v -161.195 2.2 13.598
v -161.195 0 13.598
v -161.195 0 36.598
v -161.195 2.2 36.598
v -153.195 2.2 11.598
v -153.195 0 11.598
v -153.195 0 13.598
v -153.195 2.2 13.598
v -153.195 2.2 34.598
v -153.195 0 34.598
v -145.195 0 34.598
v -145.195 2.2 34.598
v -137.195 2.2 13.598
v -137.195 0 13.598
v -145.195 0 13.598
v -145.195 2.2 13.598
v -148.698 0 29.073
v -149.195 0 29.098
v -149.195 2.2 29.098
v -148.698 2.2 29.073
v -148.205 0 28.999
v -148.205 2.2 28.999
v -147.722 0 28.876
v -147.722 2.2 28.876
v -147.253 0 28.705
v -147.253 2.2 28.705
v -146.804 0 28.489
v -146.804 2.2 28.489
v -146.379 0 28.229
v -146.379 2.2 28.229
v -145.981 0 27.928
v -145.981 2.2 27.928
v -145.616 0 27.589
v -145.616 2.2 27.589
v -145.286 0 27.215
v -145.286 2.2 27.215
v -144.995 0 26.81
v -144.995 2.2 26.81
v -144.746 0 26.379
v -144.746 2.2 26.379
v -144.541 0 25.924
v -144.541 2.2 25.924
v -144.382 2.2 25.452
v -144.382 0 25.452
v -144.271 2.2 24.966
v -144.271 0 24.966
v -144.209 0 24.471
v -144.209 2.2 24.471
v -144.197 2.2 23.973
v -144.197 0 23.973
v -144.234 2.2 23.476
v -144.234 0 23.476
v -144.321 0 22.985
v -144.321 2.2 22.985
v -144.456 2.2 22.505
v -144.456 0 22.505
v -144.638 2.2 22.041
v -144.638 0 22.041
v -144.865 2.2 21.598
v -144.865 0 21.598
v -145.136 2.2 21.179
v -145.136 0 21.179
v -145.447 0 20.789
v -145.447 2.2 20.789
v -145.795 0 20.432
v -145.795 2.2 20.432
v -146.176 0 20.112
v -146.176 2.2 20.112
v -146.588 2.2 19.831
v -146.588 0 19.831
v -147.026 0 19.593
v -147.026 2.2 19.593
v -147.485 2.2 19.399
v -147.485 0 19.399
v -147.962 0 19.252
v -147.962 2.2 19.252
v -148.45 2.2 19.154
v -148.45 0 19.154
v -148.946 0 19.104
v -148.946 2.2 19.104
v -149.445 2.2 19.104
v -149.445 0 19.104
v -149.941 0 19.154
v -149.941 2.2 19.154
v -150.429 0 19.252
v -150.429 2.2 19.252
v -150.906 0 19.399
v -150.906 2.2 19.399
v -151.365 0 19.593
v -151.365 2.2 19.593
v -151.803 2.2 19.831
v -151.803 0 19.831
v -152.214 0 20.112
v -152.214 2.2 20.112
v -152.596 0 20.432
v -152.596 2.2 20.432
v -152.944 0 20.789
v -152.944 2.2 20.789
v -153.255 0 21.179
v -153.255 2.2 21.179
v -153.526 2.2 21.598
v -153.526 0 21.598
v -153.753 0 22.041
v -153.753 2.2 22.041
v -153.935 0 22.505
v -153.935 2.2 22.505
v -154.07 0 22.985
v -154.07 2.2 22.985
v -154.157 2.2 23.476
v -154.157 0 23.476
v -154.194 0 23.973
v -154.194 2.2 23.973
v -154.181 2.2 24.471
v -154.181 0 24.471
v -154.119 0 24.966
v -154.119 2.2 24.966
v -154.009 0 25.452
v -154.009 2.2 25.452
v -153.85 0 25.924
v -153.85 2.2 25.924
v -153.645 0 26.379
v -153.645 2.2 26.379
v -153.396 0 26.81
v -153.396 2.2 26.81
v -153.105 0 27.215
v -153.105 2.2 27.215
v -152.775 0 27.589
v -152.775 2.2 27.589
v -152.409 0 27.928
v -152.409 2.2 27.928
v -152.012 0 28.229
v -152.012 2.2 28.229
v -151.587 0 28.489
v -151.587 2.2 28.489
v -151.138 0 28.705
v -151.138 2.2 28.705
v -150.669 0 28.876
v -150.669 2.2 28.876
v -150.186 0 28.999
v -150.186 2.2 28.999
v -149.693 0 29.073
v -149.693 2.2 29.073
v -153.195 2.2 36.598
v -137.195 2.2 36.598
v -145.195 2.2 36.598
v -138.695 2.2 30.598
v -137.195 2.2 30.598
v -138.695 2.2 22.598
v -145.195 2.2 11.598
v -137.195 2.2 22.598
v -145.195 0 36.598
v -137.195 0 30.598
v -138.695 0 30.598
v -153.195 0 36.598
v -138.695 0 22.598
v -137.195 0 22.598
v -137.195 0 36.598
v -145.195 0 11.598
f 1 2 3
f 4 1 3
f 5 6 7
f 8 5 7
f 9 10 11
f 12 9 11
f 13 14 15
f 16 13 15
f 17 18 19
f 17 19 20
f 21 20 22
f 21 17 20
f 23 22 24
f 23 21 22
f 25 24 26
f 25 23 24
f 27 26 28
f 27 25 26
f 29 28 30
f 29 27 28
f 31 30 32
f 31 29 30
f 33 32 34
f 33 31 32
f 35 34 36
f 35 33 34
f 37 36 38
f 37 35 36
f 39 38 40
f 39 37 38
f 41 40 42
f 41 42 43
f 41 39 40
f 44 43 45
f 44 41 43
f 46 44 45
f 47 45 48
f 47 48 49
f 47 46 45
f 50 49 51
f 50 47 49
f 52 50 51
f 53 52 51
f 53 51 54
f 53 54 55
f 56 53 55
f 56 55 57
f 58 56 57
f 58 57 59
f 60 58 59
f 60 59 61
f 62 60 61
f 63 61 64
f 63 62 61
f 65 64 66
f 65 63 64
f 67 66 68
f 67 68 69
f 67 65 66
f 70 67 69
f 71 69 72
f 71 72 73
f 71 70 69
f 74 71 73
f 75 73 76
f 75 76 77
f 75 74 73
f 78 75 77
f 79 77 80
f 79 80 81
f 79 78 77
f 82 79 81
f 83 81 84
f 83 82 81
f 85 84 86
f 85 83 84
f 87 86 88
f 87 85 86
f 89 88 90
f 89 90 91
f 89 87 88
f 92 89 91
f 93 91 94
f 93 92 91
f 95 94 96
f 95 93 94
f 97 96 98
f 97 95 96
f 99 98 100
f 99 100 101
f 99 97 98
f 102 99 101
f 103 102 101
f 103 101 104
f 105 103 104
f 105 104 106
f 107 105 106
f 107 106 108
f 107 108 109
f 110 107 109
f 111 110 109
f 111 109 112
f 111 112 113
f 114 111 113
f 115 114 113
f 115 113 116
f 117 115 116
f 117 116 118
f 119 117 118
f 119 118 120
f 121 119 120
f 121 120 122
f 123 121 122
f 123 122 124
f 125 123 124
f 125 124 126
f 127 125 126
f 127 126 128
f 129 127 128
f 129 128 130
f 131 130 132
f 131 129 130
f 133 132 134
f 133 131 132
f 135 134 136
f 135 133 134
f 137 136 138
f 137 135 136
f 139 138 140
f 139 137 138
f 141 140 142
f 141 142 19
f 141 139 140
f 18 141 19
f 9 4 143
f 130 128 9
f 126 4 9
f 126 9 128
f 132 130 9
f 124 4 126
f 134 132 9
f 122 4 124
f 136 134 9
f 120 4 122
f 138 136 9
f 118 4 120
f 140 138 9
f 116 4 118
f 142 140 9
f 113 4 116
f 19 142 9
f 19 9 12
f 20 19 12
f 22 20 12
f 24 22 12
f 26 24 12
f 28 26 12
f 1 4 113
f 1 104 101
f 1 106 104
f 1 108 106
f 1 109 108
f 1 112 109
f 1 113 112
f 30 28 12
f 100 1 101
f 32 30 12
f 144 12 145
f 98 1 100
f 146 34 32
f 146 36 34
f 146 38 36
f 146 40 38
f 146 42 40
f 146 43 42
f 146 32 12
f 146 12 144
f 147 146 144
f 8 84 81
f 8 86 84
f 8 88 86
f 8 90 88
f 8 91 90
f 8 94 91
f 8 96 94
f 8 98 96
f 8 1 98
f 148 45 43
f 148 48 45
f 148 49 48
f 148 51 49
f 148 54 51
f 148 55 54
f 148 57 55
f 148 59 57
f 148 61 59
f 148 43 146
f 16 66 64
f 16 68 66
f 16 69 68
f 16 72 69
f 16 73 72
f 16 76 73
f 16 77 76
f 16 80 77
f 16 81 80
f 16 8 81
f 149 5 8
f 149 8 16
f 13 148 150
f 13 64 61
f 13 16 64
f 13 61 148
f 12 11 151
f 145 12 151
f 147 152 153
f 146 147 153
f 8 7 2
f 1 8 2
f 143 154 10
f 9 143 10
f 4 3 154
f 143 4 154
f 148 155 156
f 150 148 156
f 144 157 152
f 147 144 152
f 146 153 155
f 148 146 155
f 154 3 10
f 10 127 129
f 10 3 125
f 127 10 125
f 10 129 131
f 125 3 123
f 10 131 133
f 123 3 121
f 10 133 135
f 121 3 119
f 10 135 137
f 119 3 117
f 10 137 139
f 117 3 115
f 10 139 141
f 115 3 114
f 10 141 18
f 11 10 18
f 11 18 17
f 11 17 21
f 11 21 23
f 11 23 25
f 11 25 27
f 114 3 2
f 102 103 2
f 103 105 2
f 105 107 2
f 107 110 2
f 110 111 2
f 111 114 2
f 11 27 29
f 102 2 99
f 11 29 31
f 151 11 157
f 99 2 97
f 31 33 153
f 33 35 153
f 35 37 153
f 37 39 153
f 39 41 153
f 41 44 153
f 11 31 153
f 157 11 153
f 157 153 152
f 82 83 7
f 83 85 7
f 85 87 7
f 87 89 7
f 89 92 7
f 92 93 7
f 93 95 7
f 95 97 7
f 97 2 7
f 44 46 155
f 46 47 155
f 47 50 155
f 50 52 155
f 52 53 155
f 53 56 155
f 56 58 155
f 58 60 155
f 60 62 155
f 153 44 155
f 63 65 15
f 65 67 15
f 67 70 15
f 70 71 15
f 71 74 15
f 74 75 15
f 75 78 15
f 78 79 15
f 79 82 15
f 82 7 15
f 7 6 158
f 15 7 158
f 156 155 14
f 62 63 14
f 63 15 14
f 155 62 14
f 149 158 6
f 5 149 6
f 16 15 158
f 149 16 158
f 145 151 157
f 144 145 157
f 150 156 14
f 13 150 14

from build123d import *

# Parameters (mm, degrees)
SKETCH1_R           = 5
BOSS_EXTRUDE1_DEPTH = 2.2


with BuildPart() as part:
    # Sketch1 → Boss-Extrude1 (new body)
    with BuildSketch(Plane(origin=(0, 0, 0), x_dir=(1, 0, 0), z_dir=(0, 1, 0))):
        Polygon((-145.195425431, -13.597712716), (-145.195425431, -11.597712716), (-153.195425431, -11.597712716), (-153.195425431, -13.597712716), (-161.195425431, -13.597712716), (-161.195425431, -36.597712716), (-153.195425431, -36.597712716), (-153.195425431, -34.597712716), (-145.195425431, -34.597712716), (-145.195425431, -36.597712716), (-137.195425431, -36.597712716), (-137.195425431, -30.597712716), (-138.695425431, -30.597712716), (-138.695425431, -22.597712716), (-137.195425431, -22.597712716), (-137.195425431, -16.597712716), (-137.195425431, -13.597712716), align=None)
        with Locations(Location((-149.195425431, -24.097712716, 0), (0, 0, 270))):
            Circle(SKETCH1_R, mode=Mode.SUBTRACT)
    extrude(amount=BOSS_EXTRUDE1_DEPTH)


solid = part.part
